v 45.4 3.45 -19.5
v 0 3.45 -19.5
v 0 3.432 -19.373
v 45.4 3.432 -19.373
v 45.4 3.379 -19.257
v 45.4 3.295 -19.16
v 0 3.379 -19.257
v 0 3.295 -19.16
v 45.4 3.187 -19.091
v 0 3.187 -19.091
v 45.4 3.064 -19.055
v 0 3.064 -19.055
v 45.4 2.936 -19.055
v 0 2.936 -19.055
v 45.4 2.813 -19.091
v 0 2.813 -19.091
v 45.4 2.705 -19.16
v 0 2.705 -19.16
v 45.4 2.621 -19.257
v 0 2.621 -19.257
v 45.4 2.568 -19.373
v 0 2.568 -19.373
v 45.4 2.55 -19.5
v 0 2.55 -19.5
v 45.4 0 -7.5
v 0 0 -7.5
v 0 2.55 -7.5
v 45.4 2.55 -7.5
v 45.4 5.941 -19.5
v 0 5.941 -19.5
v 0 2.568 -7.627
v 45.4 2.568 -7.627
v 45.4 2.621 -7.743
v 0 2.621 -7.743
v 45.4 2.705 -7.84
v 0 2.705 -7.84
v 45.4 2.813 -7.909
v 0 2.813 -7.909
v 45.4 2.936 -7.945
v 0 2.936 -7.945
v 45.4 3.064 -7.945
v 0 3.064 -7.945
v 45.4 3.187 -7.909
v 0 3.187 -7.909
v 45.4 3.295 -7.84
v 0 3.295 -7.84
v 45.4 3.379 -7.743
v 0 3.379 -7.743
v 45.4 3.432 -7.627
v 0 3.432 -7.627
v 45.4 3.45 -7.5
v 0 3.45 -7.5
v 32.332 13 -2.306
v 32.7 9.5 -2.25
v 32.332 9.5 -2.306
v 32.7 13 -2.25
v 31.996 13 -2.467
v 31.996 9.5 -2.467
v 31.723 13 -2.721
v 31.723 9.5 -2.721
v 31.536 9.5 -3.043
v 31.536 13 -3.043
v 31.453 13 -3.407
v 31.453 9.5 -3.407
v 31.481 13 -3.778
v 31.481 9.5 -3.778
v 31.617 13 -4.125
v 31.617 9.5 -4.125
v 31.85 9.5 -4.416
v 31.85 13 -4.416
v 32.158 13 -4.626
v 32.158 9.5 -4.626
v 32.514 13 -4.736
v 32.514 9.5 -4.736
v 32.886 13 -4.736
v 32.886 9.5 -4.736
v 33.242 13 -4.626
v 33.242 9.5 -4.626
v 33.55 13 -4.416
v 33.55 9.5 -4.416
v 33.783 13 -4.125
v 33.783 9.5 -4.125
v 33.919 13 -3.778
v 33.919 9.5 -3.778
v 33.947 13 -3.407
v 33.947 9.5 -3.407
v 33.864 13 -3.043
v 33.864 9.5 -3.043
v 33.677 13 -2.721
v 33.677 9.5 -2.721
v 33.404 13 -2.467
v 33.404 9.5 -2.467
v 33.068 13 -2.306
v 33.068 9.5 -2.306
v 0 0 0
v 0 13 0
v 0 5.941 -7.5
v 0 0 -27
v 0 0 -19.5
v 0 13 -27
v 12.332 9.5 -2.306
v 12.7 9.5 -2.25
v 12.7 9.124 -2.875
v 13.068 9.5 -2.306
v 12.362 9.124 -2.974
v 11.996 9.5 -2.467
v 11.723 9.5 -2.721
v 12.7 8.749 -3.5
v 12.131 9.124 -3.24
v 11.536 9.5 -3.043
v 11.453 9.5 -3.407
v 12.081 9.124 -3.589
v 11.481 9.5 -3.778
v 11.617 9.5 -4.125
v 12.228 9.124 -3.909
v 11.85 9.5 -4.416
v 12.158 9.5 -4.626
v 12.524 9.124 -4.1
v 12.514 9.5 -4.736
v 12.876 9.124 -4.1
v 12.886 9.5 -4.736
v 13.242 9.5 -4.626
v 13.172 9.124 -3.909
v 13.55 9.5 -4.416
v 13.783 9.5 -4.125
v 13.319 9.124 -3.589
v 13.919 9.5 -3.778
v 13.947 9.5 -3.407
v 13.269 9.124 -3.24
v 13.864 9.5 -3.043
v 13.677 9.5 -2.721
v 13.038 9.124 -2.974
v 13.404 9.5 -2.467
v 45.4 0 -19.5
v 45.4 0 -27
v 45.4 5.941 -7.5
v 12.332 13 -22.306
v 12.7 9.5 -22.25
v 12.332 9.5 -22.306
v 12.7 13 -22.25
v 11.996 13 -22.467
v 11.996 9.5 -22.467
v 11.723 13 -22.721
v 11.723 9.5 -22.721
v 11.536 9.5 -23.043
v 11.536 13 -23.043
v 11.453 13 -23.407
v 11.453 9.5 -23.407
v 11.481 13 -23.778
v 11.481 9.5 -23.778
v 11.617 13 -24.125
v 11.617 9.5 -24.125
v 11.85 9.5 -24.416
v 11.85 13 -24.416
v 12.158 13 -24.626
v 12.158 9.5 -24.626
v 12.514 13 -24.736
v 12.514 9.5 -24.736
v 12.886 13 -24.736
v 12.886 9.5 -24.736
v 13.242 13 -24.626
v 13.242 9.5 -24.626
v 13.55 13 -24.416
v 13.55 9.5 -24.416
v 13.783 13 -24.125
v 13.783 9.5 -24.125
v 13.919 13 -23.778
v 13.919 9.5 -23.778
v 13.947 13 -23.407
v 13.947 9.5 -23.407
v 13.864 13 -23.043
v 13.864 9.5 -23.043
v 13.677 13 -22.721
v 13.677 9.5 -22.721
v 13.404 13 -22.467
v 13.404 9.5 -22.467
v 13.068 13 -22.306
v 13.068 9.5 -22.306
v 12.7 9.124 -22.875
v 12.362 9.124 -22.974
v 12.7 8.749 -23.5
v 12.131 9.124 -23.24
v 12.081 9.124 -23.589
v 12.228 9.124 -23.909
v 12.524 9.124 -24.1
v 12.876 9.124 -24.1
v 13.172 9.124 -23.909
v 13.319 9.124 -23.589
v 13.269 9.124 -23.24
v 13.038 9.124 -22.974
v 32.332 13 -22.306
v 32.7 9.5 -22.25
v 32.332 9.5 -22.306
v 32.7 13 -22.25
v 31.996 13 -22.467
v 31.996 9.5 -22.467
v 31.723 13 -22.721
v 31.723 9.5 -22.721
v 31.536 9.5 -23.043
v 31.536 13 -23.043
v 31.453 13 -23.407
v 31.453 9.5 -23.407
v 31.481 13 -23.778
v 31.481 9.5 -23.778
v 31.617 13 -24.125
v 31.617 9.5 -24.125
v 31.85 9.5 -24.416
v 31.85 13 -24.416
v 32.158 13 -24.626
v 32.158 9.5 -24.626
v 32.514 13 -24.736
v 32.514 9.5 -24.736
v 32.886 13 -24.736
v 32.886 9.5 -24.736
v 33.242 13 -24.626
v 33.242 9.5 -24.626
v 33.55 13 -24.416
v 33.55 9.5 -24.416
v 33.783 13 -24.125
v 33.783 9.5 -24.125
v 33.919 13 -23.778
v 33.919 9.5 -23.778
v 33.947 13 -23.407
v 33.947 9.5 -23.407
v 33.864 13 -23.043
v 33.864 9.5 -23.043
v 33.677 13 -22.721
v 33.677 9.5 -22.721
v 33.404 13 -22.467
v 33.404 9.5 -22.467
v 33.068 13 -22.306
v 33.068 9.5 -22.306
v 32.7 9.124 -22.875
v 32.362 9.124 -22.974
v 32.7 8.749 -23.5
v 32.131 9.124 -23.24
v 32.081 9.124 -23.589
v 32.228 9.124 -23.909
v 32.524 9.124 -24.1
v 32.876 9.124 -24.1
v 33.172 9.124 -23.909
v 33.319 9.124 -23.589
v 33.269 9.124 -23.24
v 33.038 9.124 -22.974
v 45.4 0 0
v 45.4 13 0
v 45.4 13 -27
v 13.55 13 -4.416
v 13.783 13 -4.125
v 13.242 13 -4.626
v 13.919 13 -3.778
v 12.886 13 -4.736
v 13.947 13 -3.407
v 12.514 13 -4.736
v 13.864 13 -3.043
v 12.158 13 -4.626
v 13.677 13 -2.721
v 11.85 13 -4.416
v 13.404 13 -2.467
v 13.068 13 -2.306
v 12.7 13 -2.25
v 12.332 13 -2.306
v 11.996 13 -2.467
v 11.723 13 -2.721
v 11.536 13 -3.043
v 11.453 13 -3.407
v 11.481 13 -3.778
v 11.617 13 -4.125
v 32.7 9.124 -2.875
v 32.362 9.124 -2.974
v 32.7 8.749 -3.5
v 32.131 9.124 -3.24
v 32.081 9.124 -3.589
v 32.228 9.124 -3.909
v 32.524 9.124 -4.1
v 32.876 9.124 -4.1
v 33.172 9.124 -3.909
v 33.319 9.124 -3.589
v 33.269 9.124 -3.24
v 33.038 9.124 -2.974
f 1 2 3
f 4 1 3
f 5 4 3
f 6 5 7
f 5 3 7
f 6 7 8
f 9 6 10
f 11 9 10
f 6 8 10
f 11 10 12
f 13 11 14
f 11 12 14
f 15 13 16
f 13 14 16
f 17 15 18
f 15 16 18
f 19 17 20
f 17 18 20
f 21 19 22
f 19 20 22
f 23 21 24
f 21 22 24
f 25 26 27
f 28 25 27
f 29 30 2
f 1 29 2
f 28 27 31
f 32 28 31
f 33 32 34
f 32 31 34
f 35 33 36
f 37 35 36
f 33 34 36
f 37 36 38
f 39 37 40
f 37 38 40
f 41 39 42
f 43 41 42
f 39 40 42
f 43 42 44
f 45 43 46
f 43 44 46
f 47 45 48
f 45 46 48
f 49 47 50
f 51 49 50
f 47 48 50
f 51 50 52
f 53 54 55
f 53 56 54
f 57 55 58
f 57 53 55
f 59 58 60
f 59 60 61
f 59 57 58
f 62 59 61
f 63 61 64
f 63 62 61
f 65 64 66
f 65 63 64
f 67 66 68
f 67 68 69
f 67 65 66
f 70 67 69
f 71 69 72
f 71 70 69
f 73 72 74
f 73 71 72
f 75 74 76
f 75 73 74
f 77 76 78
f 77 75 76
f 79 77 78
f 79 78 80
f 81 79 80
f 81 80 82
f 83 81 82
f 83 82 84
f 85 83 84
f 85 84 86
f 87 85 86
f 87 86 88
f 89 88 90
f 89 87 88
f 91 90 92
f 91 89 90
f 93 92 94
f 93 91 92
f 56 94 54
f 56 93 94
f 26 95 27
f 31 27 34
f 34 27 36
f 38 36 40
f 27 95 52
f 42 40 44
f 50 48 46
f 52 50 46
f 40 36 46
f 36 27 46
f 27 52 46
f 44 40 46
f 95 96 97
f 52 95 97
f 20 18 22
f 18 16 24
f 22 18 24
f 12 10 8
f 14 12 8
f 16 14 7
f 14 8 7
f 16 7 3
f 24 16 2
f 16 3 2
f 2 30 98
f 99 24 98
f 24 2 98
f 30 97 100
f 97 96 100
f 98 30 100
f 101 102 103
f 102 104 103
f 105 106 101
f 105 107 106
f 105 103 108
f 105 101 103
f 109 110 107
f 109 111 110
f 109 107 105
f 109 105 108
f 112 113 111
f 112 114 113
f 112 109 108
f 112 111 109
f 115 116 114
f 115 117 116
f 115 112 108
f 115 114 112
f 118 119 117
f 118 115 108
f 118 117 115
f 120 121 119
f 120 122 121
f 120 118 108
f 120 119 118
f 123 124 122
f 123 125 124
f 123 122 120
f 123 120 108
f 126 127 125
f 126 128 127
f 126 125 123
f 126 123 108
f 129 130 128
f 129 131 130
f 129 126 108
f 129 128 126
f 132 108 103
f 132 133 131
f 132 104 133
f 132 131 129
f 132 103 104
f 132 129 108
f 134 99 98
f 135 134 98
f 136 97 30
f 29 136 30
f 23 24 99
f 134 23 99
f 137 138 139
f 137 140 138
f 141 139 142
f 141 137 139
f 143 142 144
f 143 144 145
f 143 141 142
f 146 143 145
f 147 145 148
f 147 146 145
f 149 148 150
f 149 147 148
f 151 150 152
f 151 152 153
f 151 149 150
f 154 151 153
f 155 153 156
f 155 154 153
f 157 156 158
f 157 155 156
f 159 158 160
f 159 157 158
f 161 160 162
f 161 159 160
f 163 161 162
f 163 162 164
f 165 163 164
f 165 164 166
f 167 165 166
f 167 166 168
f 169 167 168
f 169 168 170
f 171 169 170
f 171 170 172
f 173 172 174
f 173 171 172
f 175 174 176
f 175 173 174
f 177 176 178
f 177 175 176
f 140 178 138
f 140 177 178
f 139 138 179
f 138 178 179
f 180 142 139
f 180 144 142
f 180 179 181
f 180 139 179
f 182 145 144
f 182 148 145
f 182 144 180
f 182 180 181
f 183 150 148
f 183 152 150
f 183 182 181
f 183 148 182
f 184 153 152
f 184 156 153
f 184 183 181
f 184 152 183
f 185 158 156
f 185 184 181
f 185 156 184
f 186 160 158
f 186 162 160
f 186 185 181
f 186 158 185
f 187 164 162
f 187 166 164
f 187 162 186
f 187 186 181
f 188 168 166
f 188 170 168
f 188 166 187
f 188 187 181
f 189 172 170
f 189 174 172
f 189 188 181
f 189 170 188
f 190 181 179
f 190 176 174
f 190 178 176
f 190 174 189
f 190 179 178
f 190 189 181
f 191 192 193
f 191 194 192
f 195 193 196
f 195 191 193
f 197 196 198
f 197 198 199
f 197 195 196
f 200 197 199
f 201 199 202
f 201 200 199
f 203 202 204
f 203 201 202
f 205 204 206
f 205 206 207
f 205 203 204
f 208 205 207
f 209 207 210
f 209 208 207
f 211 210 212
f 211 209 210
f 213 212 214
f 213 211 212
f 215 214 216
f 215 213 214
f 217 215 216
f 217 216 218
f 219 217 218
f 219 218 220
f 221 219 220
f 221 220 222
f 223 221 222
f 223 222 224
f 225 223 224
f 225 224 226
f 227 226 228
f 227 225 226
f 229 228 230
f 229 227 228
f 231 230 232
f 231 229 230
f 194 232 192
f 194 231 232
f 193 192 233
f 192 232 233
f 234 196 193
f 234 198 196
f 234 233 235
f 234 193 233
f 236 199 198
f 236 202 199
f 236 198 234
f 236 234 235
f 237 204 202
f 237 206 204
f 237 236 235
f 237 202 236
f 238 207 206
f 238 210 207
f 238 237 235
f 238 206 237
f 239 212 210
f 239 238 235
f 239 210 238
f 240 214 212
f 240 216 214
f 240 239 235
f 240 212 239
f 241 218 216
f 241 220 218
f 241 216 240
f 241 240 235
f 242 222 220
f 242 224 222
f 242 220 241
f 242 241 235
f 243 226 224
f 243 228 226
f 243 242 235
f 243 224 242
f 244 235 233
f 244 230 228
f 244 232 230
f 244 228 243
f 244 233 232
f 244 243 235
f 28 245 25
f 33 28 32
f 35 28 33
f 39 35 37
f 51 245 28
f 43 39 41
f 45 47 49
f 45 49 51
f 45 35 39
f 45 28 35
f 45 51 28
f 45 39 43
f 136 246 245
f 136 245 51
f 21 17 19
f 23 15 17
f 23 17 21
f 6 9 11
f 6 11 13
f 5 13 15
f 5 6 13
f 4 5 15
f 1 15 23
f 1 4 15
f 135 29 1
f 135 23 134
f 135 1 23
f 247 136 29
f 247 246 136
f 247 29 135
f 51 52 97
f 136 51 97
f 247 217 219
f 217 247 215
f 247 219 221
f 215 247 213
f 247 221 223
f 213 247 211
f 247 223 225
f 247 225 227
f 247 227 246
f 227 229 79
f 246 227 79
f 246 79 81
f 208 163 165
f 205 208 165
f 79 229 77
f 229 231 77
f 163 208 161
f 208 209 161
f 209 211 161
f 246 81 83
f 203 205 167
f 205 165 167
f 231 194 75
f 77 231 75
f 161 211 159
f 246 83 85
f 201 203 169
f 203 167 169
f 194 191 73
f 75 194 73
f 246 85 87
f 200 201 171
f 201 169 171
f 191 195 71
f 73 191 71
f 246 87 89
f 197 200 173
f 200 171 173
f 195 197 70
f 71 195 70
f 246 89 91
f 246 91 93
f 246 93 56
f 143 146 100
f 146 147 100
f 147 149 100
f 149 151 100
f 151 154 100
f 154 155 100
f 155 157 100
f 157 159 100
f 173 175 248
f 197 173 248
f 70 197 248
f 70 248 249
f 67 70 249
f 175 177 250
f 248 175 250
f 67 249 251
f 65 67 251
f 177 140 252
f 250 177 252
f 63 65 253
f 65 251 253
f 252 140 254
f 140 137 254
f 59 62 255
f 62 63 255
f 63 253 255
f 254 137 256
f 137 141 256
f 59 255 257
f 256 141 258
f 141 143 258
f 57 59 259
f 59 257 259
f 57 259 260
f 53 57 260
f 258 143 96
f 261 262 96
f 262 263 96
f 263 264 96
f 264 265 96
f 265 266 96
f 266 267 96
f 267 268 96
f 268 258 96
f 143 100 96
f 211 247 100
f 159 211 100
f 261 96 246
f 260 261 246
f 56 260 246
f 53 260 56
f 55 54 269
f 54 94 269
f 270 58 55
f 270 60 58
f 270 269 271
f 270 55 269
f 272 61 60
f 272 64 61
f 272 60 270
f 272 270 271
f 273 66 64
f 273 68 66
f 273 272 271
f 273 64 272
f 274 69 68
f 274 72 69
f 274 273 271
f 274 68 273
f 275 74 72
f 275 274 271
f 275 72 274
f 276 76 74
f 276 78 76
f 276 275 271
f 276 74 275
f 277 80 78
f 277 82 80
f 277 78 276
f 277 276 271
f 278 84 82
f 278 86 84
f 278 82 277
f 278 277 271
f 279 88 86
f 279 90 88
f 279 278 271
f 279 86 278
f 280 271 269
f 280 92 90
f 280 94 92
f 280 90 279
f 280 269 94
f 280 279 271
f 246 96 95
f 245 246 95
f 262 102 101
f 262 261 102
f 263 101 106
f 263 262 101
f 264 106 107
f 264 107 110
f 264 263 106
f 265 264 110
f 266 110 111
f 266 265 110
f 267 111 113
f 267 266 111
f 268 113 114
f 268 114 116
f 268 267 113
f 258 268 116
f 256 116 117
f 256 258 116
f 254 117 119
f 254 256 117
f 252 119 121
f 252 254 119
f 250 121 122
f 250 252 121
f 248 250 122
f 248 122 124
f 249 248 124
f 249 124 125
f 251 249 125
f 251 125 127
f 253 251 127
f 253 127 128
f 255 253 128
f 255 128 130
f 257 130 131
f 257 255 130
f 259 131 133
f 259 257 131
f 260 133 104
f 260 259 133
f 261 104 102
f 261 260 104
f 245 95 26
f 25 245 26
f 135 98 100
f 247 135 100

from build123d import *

# Parameters (mm, degrees)
BOSS_EXTRUDE1_DEPTH  = 45.4
LPATTERN1_COUNT      = 2
LPATTERN1_PITCH      = 20
LPATTERN1_COUNT_DIR2 = 2
LPATTERN1_PITCH_DIR2 = 20


with BuildPart() as part:
    # Sketch1 → Boss-Extrude1 (new body)
    with BuildSketch(Plane(origin=(0, 0, 0), x_dir=(0, 0, -1), z_dir=(1, 0, 0))):
        Polygon((19.5, 5.941454138), (19.5, 0), (27, 0), (27, 13), (0, 13), (0, 0), (7.5, 0), (7.5, 5.941454138), align=None)
        with BuildLine():
            Line((7.5, 3.45), (7.5, 2.55))
            ThreePointArc((7.5, 2.55), (7.95, 3), (7.5, 3.45))
        make_face()
        with BuildLine():
            ThreePointArc((19.5, 3.45), (19.05, 3), (19.5, 2.55))
            Line((19.5, 2.55), (19.5, 3.45))
        make_face()
    extrude(amount=BOSS_EXTRUDE1_DEPTH)

    # Sketch3 → M3x0.5 Tapped Hole1 (revolve, cut)
    with BuildSketch(Plane(origin=(12.7, 13, -23.5), x_dir=(0, 0, 1), z_dir=(1, 0, 0))):
        Polygon((0, 0), (0, 4.251075774), (1.25, 3.5), (1.25, 0), align=None)
    m3x0_5_tapped_hole1 = revolve(axis=Axis((12.7, 19.35, -23.5), (0, -1, 0)), mode=Mode.SUBTRACT)

    # LPattern1: M3x0.5 Tapped Hole1 2 × 2
    with Locations(*[(i * LPATTERN1_PITCH, 0, j * LPATTERN1_PITCH_DIR2) for i in range(LPATTERN1_COUNT) for j in range(LPATTERN1_COUNT_DIR2) if (i, j) != (0, 0)]):
        add(m3x0_5_tapped_hole1, mode=Mode.SUBTRACT)


solid = part.part
